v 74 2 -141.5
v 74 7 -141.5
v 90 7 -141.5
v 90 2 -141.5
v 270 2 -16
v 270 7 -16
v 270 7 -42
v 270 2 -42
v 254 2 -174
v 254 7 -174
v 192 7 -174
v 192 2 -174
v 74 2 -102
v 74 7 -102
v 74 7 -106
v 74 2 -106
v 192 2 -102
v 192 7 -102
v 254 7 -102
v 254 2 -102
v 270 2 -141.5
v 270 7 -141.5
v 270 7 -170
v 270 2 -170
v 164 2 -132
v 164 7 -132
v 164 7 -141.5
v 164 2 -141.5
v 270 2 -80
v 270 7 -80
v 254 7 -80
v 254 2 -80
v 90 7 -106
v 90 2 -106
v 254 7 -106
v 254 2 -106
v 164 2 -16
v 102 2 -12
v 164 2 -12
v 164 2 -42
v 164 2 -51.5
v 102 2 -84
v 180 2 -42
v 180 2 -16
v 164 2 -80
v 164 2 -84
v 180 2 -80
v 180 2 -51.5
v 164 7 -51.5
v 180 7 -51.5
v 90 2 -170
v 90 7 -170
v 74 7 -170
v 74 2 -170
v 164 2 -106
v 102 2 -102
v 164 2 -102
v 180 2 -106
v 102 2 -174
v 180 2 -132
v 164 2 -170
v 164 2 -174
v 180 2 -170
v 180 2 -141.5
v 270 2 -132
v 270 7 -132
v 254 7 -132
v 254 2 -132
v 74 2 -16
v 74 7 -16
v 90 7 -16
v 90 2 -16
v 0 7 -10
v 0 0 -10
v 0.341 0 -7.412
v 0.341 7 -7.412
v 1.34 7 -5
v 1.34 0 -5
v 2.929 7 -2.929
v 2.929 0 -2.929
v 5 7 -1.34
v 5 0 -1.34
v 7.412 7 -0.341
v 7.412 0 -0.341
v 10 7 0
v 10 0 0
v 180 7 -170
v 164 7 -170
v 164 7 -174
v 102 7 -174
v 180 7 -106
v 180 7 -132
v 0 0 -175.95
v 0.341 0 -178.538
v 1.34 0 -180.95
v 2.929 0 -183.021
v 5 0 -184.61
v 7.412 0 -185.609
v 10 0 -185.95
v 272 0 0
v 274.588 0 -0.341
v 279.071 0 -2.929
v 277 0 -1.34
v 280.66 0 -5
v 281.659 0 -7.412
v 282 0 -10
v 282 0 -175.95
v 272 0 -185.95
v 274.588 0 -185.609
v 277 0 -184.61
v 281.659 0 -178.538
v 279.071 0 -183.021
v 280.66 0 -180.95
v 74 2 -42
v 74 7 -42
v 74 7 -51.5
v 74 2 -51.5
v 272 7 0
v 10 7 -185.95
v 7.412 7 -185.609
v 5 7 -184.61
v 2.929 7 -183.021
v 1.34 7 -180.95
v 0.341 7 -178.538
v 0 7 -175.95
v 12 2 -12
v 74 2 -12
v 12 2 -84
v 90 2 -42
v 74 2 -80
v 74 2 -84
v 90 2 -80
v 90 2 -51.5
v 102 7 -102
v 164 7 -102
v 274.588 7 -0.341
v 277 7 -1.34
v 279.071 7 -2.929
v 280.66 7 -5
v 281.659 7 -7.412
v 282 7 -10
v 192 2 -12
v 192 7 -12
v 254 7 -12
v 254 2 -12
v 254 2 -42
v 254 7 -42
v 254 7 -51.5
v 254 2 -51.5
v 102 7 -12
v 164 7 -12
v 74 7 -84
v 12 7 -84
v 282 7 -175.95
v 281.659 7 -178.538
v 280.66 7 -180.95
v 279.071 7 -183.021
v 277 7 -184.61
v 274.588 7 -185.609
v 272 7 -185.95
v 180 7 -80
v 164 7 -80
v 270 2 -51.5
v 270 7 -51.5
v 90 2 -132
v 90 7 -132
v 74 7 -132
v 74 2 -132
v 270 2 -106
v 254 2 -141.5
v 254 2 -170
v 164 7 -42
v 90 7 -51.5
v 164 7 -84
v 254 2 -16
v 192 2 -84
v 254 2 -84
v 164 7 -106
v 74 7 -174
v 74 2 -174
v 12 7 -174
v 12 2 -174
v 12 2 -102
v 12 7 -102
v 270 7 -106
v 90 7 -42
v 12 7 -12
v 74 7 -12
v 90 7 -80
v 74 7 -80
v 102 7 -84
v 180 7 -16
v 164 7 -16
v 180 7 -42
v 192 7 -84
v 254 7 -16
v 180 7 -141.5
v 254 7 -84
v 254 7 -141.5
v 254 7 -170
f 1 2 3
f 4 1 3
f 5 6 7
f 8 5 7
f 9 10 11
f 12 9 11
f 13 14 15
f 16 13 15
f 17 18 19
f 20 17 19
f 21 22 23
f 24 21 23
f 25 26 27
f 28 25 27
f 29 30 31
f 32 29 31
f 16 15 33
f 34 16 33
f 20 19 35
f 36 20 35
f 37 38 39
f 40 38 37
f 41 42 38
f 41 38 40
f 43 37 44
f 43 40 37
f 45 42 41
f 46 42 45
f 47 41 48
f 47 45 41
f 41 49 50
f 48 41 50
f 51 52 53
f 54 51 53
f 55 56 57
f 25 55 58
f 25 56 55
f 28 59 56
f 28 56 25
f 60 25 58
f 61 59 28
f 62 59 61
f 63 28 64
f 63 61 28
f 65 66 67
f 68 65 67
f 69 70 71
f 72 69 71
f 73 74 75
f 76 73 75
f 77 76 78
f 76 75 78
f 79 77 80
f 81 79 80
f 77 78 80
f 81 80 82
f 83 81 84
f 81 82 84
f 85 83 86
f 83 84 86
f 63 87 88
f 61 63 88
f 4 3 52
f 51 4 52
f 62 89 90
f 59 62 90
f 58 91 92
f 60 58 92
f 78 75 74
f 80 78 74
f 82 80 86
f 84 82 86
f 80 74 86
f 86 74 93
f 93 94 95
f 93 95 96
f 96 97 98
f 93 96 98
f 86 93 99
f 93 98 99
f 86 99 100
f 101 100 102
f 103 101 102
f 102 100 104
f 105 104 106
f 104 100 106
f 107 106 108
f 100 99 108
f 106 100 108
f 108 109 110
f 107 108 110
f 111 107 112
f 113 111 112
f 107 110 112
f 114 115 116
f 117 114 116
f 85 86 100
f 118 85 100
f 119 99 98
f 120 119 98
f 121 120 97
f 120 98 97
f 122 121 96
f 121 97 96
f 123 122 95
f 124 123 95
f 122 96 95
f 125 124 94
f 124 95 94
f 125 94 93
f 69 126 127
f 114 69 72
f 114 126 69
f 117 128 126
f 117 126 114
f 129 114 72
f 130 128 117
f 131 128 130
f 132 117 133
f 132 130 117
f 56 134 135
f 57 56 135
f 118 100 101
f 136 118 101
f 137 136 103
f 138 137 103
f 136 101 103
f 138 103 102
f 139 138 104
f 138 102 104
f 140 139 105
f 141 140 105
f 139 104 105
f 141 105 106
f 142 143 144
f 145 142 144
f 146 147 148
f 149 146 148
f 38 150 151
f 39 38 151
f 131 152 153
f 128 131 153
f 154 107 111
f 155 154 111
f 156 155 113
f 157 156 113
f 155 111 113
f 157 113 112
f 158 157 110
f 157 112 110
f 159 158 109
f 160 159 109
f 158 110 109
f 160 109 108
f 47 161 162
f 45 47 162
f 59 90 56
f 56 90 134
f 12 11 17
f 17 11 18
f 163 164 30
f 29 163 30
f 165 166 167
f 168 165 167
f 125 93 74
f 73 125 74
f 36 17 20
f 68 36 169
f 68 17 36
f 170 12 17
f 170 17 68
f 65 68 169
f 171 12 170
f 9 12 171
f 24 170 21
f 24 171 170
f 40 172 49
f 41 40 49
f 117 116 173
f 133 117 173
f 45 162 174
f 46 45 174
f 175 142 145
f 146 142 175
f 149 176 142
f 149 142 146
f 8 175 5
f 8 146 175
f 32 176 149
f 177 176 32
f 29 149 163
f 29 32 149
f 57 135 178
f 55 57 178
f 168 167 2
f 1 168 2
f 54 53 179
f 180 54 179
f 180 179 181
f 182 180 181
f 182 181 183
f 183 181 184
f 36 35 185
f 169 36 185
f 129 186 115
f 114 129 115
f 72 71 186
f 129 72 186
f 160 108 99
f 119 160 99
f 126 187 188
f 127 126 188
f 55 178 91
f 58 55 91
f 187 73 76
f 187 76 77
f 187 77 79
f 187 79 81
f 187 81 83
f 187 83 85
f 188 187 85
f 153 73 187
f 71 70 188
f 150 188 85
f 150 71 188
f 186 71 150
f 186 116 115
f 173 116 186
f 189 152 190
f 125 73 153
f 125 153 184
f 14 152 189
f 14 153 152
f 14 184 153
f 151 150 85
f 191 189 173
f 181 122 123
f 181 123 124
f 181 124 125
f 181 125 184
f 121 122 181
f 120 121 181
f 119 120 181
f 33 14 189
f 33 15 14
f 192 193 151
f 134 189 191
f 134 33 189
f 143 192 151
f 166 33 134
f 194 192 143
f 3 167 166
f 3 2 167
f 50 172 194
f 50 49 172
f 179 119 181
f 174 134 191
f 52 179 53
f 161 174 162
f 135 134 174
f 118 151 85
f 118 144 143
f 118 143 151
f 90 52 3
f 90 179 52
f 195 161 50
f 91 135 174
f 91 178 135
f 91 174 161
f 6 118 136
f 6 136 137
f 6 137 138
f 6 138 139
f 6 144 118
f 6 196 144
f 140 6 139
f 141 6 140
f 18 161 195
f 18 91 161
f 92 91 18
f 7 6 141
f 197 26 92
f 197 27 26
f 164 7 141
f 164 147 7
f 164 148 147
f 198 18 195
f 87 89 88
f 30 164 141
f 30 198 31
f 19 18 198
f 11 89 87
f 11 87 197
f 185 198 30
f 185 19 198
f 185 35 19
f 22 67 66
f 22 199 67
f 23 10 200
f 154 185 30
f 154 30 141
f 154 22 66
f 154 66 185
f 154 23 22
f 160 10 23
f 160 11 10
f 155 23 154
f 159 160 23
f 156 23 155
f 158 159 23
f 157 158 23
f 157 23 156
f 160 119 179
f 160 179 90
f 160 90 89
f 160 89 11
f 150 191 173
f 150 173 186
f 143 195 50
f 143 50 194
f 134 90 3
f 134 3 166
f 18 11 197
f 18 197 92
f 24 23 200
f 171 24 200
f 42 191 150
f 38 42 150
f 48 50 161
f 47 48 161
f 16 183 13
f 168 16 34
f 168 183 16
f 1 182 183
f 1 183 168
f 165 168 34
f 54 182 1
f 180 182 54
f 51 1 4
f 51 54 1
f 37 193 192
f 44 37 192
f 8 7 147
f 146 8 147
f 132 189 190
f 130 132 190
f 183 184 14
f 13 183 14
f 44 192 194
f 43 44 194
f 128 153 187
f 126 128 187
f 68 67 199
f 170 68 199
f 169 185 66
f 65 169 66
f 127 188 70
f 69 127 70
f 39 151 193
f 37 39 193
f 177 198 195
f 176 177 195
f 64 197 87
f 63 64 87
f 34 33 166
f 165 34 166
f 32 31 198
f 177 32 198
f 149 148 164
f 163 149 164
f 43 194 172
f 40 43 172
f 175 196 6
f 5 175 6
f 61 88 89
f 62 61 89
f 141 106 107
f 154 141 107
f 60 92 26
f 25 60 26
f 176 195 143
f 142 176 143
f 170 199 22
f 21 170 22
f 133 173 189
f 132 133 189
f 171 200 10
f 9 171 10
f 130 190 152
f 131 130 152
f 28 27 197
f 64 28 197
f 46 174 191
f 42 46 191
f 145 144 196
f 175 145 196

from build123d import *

# Parameters (mm, degrees)
BOSS_EXTRUDE1_DEPTH = 7
CUT_EXTRUDE1_DEPTH  = 5


with BuildPart() as part:
    # Sketch2 → Boss-Extrude1 (new body)
    with BuildSketch(Plane(origin=(0, 0, 0), x_dir=(1, 0, 0), z_dir=(0, 1, 0))):
        with BuildLine():
            Line((10, 0), (272, 0))
            ThreePointArc((272, 0), (279.071067812, 2.928932188), (282, 10))
            Line((282, 10), (282, 175.95))
            ThreePointArc((282, 175.95), (279.071067812, 183.021067812), (272, 185.95))
            Line((272, 185.95), (10, 185.95))
            ThreePointArc((10, 185.95), (2.928932188, 183.021067812), (0, 175.95))
            Line((0, 175.95), (0, 10))
            ThreePointArc((0, 10), (2.928932188, 2.928932188), (10, 0))
        make_face()
    extrude(amount=BOSS_EXTRUDE1_DEPTH)

    # Sketch3 → Cut-Extrude1 (cut)
    with BuildSketch(Plane(origin=(0, 7, 0), x_dir=(1, 0, 0), z_dir=(0, 1, 0))):
        Polygon((74, 16), (90, 16), (90, 42), (74, 42), (74, 51.5), (90, 51.5), (90, 80), (74, 80), (74, 84), (12, 84), (12, 12), (74, 12), align=None)
        Polygon((180, 42), (164, 42), (164, 51.5), (180, 51.5), (180, 80), (164, 80), (164, 84), (102, 84), (102, 12), (164, 12), (164, 16), (180, 16), align=None)
        Polygon((270, 42), (254, 42), (254, 51.5), (270, 51.5), (270, 80), (254, 80), (254, 84), (192, 84), (192, 12), (254, 12), (254, 16), (270, 16), align=None)
        Polygon((180, 132), (164, 132), (164, 141.5), (180, 141.5), (180, 170), (164, 170), (164, 174), (102, 174), (102, 102), (164, 102), (164, 106), (180, 106), align=None)
        Polygon((270, 132), (254, 132), (254, 141.5), (270, 141.5), (270, 170), (254, 170), (254, 174), (192, 174), (192, 102), (254, 102), (254, 106), (270, 106), align=None)
        Polygon((90, 132), (74, 132), (74, 141.5), (90, 141.5), (90, 170), (74, 170), (74, 174), (12, 174), (12, 102), (74, 102), (74, 106), (90, 106), align=None)
    extrude(amount=-CUT_EXTRUDE1_DEPTH, mode=Mode.SUBTRACT)


solid = part.part
